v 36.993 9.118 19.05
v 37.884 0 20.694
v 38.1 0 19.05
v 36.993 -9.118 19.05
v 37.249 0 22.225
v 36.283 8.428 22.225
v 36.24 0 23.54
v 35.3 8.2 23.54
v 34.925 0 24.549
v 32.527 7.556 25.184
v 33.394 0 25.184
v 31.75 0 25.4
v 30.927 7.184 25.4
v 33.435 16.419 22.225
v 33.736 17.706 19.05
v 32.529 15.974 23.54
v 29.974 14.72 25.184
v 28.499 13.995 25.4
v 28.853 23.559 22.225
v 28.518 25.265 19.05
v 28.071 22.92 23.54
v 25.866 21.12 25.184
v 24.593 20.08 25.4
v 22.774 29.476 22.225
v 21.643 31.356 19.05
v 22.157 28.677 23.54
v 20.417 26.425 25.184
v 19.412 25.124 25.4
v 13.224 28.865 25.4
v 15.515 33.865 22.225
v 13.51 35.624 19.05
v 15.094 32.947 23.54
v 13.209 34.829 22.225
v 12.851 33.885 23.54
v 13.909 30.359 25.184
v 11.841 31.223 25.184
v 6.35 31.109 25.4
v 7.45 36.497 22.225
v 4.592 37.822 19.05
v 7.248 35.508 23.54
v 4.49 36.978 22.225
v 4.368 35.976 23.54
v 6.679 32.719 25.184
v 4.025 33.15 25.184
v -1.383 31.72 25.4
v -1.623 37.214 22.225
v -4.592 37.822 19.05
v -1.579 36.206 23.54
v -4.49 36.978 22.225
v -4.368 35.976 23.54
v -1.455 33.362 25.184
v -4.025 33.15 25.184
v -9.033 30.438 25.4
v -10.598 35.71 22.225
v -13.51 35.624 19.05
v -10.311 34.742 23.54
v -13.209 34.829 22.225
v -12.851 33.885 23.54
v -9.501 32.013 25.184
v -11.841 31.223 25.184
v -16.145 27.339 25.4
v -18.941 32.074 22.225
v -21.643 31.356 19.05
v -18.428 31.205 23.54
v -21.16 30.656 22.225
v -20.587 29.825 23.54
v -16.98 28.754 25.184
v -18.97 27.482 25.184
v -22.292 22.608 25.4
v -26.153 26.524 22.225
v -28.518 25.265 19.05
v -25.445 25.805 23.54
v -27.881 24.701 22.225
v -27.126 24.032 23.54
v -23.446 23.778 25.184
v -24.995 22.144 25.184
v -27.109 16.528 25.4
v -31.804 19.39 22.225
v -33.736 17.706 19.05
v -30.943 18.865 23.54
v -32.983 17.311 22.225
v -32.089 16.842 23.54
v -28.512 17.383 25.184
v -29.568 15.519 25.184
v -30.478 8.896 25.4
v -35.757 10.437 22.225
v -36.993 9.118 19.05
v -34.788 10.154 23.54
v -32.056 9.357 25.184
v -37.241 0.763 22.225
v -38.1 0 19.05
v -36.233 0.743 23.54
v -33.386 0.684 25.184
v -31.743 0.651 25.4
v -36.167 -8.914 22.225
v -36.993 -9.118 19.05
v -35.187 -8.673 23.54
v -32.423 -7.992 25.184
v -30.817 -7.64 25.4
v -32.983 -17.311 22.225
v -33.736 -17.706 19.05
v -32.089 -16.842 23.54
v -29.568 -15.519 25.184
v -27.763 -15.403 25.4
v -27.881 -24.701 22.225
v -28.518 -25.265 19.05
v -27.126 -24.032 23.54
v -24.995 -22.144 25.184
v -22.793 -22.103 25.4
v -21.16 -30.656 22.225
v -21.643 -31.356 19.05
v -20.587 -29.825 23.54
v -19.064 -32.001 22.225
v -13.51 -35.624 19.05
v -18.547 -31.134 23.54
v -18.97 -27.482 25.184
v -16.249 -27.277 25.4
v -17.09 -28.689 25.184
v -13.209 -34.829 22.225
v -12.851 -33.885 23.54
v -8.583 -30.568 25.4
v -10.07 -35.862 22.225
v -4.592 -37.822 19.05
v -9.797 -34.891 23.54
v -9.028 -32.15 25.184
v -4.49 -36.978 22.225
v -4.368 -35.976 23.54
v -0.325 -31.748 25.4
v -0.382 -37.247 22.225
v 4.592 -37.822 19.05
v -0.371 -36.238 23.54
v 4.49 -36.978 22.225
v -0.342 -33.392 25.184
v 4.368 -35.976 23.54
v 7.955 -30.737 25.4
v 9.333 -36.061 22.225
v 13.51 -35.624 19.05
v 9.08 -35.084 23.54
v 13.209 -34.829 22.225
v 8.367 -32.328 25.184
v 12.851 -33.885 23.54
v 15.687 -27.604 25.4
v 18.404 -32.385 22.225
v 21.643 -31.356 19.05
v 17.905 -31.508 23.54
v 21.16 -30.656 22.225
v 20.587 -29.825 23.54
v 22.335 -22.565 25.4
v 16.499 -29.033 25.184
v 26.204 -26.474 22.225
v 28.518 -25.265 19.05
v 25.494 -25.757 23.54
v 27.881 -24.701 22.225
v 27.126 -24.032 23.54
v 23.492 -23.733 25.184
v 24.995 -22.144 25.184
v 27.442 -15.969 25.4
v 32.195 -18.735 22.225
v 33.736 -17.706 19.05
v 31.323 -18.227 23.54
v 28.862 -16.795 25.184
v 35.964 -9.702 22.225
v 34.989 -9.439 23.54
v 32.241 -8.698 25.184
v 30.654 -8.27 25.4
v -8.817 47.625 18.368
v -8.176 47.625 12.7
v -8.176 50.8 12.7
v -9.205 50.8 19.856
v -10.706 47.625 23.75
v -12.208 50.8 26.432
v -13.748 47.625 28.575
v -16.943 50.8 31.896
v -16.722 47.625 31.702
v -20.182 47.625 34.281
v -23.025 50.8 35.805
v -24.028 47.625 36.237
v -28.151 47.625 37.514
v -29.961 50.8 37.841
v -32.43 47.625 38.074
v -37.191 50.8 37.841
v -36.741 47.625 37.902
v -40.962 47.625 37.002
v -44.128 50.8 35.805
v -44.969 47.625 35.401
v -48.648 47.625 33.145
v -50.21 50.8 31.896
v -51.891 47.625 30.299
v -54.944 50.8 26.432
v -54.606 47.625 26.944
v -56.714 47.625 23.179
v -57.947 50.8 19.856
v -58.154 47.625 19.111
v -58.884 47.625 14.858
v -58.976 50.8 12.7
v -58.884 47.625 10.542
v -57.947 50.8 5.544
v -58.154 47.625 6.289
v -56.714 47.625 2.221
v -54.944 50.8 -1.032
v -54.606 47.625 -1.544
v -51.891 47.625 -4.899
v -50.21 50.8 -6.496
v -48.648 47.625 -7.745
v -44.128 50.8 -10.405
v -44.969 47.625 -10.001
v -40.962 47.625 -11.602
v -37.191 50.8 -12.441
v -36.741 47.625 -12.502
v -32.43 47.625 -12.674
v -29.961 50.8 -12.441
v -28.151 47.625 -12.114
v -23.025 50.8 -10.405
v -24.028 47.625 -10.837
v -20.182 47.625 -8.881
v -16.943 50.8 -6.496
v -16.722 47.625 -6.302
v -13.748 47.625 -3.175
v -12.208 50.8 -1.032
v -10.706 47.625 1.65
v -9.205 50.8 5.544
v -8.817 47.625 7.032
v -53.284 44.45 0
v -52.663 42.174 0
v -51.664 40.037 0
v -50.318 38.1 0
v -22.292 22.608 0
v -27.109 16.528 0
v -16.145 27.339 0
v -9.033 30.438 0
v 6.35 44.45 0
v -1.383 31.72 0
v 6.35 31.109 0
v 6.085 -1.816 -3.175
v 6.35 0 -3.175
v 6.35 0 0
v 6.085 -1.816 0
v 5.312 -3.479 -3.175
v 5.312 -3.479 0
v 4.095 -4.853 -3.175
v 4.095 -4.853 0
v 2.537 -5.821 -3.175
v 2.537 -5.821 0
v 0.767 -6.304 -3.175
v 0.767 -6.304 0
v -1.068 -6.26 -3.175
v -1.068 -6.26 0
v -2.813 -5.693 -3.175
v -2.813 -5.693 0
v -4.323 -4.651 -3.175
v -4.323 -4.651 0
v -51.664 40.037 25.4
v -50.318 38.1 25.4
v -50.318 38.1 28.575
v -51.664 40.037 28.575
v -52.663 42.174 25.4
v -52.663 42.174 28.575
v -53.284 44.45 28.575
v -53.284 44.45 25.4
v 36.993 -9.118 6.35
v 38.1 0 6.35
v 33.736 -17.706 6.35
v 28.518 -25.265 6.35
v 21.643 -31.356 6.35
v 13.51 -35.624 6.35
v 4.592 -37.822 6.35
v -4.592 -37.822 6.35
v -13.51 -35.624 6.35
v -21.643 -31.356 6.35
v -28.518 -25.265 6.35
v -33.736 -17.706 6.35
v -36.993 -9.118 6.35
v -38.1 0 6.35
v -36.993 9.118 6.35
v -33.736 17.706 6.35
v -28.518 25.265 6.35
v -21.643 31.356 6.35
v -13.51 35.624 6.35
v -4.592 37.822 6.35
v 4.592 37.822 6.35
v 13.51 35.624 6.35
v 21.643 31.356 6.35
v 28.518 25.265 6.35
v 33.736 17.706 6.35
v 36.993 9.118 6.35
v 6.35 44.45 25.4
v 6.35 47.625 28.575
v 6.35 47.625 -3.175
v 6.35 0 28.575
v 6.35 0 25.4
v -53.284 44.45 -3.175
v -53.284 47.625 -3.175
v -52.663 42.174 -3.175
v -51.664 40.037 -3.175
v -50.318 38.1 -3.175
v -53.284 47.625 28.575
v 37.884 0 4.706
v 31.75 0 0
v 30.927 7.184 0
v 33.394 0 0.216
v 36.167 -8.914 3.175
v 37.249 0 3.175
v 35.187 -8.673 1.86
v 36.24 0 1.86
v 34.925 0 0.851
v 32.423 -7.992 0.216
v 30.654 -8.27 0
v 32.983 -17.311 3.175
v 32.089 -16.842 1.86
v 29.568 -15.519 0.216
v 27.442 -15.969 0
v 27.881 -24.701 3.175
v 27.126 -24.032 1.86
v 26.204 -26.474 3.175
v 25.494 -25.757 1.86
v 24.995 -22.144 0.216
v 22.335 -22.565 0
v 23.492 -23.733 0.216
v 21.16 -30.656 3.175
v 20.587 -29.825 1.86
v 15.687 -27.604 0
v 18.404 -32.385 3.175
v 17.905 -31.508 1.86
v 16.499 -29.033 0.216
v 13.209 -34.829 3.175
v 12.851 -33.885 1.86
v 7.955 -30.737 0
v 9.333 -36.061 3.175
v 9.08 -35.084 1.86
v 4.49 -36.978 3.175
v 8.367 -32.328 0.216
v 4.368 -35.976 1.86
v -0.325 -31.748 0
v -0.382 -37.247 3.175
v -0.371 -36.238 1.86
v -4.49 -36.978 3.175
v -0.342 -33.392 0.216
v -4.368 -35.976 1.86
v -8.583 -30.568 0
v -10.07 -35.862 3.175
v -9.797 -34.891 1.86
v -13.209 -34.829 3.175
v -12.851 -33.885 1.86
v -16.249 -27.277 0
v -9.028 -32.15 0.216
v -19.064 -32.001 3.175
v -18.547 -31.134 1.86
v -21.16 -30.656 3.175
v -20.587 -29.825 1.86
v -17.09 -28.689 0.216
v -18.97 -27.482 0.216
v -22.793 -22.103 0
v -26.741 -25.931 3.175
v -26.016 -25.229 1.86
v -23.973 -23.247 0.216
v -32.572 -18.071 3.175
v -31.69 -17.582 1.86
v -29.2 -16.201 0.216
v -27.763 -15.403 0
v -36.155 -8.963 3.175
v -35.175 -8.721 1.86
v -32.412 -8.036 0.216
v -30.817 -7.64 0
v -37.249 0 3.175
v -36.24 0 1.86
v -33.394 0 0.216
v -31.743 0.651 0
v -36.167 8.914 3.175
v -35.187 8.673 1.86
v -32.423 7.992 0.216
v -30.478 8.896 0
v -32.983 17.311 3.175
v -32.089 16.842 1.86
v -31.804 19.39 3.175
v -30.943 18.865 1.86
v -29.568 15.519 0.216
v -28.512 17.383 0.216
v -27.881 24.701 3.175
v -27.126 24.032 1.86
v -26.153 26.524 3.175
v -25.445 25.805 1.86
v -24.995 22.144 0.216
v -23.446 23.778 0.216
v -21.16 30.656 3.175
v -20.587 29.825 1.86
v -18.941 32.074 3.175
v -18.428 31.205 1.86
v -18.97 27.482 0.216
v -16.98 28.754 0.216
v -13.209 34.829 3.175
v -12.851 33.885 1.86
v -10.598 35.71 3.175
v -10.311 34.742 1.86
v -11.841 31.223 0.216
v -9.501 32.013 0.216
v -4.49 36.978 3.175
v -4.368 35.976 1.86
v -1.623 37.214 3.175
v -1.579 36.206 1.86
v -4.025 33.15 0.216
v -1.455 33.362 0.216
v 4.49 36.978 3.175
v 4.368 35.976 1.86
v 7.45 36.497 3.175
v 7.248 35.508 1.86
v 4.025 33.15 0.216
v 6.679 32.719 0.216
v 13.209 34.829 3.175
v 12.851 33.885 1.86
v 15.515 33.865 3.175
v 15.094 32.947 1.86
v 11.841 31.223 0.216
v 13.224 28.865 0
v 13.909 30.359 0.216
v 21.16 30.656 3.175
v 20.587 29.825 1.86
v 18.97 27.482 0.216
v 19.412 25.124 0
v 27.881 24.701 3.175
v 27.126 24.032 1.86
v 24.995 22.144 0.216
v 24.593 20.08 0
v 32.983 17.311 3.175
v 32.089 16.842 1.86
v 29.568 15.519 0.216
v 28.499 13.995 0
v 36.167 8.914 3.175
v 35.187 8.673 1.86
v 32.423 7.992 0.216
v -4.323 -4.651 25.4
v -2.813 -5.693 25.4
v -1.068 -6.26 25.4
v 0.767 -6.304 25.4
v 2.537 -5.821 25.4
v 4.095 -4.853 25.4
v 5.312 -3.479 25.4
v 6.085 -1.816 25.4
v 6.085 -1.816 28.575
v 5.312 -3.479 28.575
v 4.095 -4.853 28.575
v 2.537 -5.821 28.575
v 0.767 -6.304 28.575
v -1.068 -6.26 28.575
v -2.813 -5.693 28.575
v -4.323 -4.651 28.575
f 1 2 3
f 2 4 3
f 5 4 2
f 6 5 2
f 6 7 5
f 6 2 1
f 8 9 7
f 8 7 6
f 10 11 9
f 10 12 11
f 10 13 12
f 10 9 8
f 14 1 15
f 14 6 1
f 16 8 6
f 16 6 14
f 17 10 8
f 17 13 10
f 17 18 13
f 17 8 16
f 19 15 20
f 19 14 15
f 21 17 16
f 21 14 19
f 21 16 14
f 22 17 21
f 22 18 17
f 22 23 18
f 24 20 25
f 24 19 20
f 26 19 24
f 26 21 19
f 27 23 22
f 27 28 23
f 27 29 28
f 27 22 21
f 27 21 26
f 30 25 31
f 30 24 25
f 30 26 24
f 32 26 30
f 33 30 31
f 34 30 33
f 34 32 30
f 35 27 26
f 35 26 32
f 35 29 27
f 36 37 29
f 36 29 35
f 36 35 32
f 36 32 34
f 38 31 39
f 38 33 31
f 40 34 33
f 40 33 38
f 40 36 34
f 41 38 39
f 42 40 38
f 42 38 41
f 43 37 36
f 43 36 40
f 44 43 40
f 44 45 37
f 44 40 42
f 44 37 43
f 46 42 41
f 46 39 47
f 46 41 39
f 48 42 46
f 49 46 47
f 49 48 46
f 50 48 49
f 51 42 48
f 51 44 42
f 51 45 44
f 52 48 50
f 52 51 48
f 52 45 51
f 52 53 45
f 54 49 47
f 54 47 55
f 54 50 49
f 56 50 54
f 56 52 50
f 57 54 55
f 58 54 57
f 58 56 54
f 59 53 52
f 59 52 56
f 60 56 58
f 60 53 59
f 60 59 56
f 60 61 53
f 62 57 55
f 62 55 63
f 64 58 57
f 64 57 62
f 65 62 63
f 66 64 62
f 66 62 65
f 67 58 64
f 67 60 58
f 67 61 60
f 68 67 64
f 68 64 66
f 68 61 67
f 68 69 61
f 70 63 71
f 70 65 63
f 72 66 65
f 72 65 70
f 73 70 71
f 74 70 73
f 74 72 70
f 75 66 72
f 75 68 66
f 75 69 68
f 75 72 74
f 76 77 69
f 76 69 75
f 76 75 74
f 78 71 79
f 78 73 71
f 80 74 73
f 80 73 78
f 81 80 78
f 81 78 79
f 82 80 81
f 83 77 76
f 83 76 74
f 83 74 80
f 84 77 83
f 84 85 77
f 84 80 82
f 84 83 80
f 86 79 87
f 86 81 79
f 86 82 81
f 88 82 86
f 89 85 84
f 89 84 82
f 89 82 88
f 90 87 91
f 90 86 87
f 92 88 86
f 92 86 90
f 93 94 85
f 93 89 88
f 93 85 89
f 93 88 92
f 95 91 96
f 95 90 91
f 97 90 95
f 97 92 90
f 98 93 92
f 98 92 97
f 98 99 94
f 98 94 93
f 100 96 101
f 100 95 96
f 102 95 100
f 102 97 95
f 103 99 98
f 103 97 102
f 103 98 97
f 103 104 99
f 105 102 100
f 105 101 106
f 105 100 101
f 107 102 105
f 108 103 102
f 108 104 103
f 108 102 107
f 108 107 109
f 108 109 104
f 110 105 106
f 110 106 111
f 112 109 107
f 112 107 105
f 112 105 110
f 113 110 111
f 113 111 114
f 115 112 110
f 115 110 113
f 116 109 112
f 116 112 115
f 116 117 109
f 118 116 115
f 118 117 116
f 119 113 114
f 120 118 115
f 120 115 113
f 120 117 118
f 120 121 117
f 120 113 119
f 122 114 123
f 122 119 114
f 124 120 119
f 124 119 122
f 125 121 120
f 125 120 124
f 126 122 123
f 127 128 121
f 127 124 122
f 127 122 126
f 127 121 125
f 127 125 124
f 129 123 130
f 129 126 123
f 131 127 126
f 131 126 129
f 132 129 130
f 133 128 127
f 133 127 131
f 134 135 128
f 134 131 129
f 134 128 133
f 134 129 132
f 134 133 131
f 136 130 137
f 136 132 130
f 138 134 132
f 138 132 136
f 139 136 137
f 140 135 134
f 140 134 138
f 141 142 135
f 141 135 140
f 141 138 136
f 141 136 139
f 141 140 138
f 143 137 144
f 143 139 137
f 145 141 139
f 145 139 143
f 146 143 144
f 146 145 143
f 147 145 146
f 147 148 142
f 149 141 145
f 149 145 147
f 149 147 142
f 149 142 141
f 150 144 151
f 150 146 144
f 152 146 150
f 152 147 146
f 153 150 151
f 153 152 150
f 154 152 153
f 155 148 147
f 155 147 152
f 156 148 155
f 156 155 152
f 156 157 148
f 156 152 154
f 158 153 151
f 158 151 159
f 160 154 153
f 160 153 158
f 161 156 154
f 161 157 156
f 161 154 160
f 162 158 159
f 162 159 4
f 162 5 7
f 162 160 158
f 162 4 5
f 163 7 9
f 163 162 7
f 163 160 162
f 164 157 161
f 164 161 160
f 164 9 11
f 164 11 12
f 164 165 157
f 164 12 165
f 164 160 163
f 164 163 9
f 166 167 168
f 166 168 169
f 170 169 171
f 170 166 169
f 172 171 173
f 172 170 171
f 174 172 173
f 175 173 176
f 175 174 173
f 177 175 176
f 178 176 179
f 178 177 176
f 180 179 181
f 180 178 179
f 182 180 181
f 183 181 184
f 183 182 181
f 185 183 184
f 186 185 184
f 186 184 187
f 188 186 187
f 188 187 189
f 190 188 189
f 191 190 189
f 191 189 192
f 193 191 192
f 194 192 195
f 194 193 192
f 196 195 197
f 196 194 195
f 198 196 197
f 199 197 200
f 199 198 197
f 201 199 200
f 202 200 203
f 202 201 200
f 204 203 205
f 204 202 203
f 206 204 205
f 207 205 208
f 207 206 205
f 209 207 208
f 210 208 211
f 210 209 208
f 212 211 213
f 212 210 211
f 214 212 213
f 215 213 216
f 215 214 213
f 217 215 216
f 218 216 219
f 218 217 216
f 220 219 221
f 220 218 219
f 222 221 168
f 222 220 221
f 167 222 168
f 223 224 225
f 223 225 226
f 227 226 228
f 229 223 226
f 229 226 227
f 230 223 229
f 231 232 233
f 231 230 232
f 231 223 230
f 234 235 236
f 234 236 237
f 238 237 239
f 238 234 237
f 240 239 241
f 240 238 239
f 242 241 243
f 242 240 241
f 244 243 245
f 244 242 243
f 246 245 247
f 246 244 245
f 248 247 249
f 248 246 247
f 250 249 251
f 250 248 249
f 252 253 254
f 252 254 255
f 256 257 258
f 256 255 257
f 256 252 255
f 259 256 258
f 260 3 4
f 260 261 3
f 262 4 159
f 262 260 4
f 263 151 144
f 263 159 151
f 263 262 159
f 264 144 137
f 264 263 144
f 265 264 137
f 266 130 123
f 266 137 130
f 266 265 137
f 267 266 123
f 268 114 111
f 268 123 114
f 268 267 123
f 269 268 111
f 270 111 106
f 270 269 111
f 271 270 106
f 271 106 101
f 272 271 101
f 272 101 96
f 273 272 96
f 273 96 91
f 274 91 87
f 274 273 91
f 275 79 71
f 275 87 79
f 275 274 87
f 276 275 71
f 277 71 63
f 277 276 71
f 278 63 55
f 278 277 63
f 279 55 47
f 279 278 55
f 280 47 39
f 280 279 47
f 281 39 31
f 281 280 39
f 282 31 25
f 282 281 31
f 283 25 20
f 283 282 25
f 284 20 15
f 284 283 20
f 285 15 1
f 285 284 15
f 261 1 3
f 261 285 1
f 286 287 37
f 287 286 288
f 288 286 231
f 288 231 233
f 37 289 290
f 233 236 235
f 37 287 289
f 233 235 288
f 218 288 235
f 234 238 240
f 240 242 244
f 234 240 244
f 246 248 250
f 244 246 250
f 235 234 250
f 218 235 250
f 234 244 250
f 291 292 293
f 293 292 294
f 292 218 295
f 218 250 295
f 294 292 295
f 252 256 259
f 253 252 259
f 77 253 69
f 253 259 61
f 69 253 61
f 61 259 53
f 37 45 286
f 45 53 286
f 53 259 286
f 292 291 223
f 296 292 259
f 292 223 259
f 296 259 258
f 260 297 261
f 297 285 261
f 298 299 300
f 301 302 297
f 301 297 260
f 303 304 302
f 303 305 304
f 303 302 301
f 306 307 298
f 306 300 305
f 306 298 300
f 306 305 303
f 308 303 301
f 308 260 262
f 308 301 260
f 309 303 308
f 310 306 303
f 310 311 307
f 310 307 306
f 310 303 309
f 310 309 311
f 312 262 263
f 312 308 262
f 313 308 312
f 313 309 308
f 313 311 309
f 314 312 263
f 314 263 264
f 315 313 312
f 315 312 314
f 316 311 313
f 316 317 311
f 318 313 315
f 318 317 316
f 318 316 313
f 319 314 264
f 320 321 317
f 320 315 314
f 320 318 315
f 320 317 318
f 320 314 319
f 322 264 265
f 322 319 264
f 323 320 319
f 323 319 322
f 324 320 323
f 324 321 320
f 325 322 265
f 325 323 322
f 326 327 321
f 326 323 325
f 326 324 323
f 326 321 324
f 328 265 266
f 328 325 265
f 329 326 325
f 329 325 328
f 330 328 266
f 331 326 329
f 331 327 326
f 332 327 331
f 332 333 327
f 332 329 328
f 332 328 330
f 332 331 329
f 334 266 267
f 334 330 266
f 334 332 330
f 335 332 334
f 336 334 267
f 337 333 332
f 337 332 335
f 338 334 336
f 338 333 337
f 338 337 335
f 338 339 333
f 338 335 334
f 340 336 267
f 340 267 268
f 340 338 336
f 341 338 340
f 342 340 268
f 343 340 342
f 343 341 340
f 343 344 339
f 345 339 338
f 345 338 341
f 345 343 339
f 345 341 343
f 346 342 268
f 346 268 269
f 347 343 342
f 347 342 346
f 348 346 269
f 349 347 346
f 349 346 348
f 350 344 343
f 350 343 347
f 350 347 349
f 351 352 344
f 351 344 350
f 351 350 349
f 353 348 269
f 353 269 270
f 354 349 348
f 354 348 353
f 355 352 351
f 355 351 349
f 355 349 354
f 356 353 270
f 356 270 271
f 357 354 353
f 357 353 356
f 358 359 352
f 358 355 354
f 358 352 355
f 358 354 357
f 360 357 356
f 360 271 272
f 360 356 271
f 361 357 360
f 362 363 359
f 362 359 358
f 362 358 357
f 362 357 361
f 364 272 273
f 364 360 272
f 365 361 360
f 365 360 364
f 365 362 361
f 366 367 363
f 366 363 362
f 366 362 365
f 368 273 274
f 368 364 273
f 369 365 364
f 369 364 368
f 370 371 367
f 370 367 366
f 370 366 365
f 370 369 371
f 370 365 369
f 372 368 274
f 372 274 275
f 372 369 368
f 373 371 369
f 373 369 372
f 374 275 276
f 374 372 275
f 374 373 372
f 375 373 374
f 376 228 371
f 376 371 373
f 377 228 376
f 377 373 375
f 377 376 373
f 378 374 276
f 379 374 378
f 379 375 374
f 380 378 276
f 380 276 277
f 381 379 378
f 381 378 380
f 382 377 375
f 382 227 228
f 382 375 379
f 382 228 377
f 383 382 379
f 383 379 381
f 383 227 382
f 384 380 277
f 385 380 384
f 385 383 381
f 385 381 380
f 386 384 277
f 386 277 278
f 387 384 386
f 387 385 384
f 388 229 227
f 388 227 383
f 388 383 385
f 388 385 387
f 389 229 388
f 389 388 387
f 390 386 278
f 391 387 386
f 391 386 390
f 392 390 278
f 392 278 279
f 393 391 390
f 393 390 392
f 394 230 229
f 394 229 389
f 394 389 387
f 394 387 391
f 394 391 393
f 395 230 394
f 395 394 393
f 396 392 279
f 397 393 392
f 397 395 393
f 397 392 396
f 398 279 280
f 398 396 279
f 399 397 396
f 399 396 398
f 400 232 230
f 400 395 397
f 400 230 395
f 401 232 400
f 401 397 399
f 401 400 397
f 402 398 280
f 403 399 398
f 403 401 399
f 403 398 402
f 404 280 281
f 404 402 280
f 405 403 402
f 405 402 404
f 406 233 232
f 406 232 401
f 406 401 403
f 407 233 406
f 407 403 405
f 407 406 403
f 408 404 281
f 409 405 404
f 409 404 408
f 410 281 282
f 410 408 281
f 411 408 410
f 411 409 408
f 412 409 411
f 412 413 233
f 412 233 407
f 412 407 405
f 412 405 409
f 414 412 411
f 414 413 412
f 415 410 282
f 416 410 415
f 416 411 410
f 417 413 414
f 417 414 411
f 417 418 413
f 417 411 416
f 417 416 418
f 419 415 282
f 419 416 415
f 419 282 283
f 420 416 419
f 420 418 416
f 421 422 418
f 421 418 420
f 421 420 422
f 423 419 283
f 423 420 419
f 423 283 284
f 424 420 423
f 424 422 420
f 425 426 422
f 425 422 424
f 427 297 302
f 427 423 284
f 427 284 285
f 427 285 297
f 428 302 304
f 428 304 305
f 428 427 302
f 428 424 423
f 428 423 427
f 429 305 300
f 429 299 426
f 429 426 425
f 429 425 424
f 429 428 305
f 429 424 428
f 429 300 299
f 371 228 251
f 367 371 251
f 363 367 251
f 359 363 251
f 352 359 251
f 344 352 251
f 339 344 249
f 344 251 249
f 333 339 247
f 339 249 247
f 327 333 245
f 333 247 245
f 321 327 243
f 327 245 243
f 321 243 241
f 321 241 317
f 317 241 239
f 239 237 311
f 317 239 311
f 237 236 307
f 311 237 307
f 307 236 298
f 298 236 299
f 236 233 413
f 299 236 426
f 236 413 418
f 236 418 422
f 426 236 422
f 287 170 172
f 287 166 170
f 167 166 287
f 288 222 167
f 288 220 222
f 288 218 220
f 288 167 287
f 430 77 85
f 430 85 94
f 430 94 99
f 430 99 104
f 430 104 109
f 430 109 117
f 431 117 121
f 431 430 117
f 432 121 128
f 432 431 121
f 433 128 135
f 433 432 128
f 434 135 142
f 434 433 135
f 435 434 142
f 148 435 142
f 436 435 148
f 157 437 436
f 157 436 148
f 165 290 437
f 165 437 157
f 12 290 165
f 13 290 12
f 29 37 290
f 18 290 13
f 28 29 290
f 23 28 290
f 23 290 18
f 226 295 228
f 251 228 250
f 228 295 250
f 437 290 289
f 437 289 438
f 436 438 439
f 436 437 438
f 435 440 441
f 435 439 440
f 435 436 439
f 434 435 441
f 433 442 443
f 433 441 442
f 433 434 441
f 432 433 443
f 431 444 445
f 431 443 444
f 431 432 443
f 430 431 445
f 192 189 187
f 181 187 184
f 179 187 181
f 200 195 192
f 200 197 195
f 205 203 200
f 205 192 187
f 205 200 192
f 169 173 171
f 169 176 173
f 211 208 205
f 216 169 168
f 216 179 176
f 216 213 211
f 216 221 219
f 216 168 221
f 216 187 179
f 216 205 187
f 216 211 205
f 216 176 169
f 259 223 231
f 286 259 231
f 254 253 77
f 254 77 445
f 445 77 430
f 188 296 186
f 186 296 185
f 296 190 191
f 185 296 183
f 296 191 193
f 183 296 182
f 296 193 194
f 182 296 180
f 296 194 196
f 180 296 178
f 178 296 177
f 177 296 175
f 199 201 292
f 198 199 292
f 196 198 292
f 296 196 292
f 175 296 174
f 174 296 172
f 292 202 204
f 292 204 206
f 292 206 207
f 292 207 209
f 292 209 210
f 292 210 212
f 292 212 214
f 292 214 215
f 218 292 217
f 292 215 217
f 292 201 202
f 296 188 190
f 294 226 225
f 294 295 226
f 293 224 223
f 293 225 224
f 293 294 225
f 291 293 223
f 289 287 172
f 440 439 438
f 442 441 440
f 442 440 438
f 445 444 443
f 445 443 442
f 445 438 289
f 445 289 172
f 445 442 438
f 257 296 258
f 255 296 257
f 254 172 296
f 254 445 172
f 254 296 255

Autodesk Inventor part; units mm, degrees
ref_plane "YZ Plane" through (0, 0, 0) normal (1, 0, 0) x (0, 1, 0)
ref_plane "XZ Plane" through (0, 0, 0) normal (0, 1, 0) x (-1, 0, 0)
ref_plane "XY Plane" through (0, 0, 0) normal (0, 0, 1) x (1, 0, 0)
sketch "Sketch1" plane through (0, 0, 0) normal (0, 0, 1) x (1, 0, 0)
  circle A0 centre (0, 0) radius 38.1
  dimension "d0" = 76.2
extrude "Extrusion1" add sketch "Sketch1" along normal blind 25.4
fillet "Fillet1" radius 6.35 2 edges at (-38.1, 0, 25.4) (-38.1, 0, 0)
sketch "Sketch3" plane through (0, 0, 25.4) normal (0, 0, 1) x (1, 0, 0)
  line L0 (6.35, 44.45) -> (-53.2838, 44.45)
  circle A0 centre (0, 0) radius 38.1 projected
  arc A1 (-4.3231, -4.6511) -> (6.35, 0) centre (0, 0) ccw
  line L1 (6.35, 0) -> (6.35, 44.45)
  arc A2 (-53.2838, 44.45) -> (-47.6982, 35.6648) centre (-39.6513, 46.9493) ccw
  line L2 (-50.3182, 38.1) -> (-4.3231, -4.6511)
  dimension "d8" = 44.45
  dimension "d9" = 76.2
  dimension "d10" = 12.7
extrude "Extrusion2" add sketch "Sketch3" along normal blind 3.175 contours L1 A0 L2 A2 L0 | L1 A1 L2 A0 picked at (-4.398, 10.0922)
pattern_linear "Rectangular Pattern1" count 2 spacing 28.575 along (0, 0, -1) of "Extrusion2"
sketch "Sketch4" plane through (-53.2838, 44.45, 25.4) normal (0, 1, 0) x (1, 0, 0)
  line L0 (59.6338, -3.175) -> (0, -3.175) projected
  line L1 (59.6338, 28.575) -> (0, 28.575) projected
  line L2 (0, -3.175) -> (59.6338, -3.175)
  line L3 (59.6338, -3.175) -> (59.6338, 28.575)
  line L4 (59.6338, 28.575) -> (0, 28.575)
  line L5 (0, 28.575) -> (0, -3.175)
  point P0 (53.2838, 25.4)
  dimension "d20" = 31.75
extrude "Extrusion3" add sketch "Sketch4" along normal blind 3.175
sketch "Sketch5" plane through (-53.2838, 47.625, 25.4) normal (0, 1, 0) x (1, 0, 0)
  circle A0 centre (19.7076, 12.7) radius 25.4
  line L0 (59.6338, 28.575) -> (0, 28.575) projected
  line L1 (59.6338, -3.175) -> (59.6338, 28.575) projected
  dimension "d19" = 15.875
  dimension "d21" = 50.8
extrude "Extrusion4" add sketch "Sketch5" along normal blind 3.175
equation "\"d19\" = 0.5 * d20"
properties part number "Caster Placeholder" material "Aluminum 6061"
